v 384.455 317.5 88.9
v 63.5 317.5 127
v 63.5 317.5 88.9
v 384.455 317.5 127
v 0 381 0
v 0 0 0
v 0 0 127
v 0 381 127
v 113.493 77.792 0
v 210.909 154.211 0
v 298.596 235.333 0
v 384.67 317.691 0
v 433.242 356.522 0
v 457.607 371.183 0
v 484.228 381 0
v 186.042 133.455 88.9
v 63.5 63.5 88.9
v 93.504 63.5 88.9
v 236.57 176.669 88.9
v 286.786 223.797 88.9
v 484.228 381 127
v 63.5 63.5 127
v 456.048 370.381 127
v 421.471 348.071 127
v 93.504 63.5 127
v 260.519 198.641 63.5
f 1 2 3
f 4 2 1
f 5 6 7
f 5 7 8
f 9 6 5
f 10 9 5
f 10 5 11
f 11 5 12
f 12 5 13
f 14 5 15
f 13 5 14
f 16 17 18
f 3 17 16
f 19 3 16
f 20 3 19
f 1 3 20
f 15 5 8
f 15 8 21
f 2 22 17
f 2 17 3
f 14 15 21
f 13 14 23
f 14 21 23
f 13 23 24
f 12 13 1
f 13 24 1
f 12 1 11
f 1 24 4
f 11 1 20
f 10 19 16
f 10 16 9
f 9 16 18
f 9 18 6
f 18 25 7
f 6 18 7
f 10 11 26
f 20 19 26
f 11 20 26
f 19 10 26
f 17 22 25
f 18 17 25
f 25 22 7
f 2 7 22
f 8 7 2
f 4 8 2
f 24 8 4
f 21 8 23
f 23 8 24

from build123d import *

# Parameters (mm, degrees)
F0_W     = 508
F0_H     = 381
F1_DEPTH = 127
F2_W     = 381
F2_H     = 254
F3_DEPTH = 38.1
F5_DEPTH = 127.001


with BuildPart() as f1:
    # F0 (on Top) → F1 (new body)
    with BuildSketch(Plane.XY):
        with Locations((254, 190.5)):
            Rectangle(F0_W, F0_H)
    extrude(amount=F1_DEPTH)

    # F2 (on face) → F3 (cut)
    with BuildSketch(Plane.XY.offset(127)):
        with Locations((254, 190.5)):
            Rectangle(F2_W, F2_H)
    extrude(amount=-F3_DEPTH, mode=Mode.SUBTRACT)

    # F4 (on face) → F5 (cut, through all)
    with BuildSketch(Plane.XY.offset(127)):
        with BuildLine():
            Line((444.5, 317.5), (384.4547422164, 317.5))
            add(Edge.make_bspline(
                [(93.5035740318, 63.5), (147.2071592582, 101.4136170576), (240.8619840218, 173.7700888717), (344.3781582981, 281.8687103961), (384.4547422164, 317.4999999999)],
                knots=[0.1203807823, 0.1203807823, 0.1203807823, 0.1203807823, 0.3259105165, 0.4706282149, 0.4706282149, 0.4706282149, 0.4706282149], degree=3))
            Line((93.5035740318, 63.5), (444.5, 63.5))
            Line((444.5, 63.5), (444.5, 317.5))
        make_face()
        with BuildLine():
            Line((508, 0), (508, 381))
            Line((508, 381), (484.2276728464, 381))
            add(Edge.make_bspline(
                [(384.4547422164, 317.4999999999), (421.0763564574, 350.0595451308), (455.4476445846, 375.0758613525), (484.2276728464, 381)],
                knots=[0.4706282149, 0.4706282149, 0.4706282149, 0.4706282149, 0.6028699184, 0.6028699184, 0.6028699184, 0.6028699184], degree=3))
            Line((384.4547422164, 317.5), (444.5, 317.5))
            Line((444.5, 317.5), (444.5, 63.5))
            Line((444.5, 63.5), (93.5035740318, 63.5))
            add(Edge.make_bspline(
                [(0, 0), (31.0244285766, 20.6468112151), (62.0488571531, 41.2936224301), (93.5035740318, 63.5)],
                knots=[0, 0, 0, 0, 0.1203807823, 0.1203807823, 0.1203807823, 0.1203807823], degree=3))
            Line((0, 0), (508, 0))
        make_face()
        with BuildLine():
            add(Edge.make_bspline(
                [(508, 381), (576.339941908, 364.0495678727), (596.4256136065, 182.0247839364), (616.511285305, 0)],
                knots=[0.6416145202, 0.6416145202, 0.6416145202, 0.6416145202, 1, 1, 1, 1], degree=3))
            Line((508, 381), (508, 0))
            Line((508, 0), (616.511285305, 0))
        make_face()
    extrude(amount=-F5_DEPTH, mode=Mode.SUBTRACT)


solid = f1.part
